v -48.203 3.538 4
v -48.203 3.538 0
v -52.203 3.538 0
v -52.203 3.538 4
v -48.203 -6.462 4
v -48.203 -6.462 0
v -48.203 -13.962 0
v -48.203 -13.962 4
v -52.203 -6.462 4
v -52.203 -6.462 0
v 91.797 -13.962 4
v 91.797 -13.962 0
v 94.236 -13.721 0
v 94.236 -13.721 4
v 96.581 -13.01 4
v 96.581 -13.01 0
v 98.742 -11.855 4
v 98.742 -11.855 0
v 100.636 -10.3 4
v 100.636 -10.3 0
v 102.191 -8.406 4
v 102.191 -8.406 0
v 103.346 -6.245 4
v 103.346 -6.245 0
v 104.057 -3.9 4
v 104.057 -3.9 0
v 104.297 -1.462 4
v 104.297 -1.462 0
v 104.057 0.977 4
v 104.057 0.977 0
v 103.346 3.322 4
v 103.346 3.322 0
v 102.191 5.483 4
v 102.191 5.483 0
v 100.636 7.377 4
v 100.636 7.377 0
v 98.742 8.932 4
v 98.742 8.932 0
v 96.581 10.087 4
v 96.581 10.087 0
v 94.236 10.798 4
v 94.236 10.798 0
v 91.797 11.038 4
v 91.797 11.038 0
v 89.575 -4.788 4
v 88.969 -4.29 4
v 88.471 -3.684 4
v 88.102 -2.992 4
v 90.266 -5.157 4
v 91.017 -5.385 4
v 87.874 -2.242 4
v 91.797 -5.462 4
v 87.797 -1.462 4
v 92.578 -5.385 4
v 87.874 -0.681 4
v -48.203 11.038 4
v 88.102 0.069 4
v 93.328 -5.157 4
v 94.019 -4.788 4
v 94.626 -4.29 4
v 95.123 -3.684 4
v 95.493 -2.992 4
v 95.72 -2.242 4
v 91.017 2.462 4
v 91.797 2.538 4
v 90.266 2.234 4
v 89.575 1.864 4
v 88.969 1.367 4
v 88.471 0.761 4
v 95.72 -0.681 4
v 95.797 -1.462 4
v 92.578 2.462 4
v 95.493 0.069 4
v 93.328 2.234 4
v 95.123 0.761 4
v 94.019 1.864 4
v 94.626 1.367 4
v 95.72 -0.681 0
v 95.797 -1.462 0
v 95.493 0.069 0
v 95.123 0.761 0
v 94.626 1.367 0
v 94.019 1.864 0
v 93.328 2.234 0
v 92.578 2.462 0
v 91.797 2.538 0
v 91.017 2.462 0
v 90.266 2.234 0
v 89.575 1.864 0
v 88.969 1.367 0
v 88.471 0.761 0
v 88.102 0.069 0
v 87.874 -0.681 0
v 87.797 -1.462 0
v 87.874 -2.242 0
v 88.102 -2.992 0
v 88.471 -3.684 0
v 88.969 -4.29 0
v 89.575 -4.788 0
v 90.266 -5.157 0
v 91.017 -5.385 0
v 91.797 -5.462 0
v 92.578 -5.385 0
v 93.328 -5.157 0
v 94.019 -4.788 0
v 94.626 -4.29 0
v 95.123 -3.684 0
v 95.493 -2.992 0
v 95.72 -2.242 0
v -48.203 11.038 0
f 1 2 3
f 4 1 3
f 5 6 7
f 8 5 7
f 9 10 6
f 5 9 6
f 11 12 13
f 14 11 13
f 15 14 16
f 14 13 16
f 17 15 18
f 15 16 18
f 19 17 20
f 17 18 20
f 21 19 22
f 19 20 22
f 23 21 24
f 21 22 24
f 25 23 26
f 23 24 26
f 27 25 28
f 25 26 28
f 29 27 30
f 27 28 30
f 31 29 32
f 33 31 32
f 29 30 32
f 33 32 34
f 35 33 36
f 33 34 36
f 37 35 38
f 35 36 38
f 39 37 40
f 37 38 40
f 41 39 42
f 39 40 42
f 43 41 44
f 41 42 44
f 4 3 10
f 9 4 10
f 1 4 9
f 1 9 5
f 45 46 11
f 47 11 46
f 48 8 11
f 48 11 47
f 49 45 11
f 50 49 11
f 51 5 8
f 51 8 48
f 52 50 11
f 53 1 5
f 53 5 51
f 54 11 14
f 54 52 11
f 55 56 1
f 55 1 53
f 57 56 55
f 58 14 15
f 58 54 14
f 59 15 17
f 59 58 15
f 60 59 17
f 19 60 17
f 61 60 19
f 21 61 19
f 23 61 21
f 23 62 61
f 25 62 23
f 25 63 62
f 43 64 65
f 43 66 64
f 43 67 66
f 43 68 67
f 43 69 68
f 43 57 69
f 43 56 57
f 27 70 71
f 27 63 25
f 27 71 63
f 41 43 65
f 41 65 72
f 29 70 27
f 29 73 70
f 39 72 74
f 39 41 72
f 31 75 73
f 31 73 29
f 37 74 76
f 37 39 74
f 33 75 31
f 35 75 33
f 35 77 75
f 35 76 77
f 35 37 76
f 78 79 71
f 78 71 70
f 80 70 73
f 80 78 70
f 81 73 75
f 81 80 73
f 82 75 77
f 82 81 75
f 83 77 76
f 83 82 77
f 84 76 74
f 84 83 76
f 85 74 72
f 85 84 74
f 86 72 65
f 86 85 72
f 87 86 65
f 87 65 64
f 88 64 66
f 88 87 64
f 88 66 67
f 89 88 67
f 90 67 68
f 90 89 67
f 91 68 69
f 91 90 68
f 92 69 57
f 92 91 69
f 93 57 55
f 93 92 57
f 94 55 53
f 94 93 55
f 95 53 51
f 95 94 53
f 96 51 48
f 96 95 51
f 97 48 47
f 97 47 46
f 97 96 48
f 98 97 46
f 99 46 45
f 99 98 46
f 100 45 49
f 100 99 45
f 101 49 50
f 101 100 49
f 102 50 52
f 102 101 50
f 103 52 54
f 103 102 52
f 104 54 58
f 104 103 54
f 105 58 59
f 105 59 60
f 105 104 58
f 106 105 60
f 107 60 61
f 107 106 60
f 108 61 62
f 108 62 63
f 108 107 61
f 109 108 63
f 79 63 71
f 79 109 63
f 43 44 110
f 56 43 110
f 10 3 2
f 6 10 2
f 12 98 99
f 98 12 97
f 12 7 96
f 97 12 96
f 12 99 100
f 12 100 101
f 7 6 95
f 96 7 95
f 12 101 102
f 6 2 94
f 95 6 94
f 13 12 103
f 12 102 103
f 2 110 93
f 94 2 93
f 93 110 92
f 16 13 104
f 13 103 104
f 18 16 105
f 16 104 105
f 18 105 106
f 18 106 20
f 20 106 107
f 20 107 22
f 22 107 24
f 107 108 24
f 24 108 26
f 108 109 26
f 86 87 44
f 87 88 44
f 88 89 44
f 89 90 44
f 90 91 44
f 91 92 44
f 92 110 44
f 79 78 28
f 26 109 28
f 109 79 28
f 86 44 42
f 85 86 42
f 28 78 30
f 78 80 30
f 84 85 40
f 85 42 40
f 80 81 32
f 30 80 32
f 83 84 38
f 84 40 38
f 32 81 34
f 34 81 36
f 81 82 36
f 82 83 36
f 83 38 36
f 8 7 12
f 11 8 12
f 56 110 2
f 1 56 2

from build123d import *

# Parameters (mm, degrees)
SKETCH2_R           = 4
BOSS_EXTRUDE1_DEPTH = 4


with BuildPart() as part:
    # Sketch2 → Boss-Extrude1 (new body)
    with BuildSketch(Plane.XY):
        with BuildLine():
            Line((-48.202812442, -6.461632916), (-48.202812442, -13.961632916))
            Line((-48.202812442, -13.961632916), (91.797187558, -13.961632916))
            ThreePointArc((91.797187558, -13.961632916), (104.297187558, -1.461632916), (91.797187558, 11.038367084))
            Line((91.797187558, 11.038367084), (-48.202812442, 11.038367084))
            Line((-48.202812442, 11.038367084), (-48.202812442, 3.538367084))
            Line((-48.202812442, 3.538367084), (-52.202812442, 3.538367084))
            Line((-52.202812442, 3.538367084), (-52.202812442, -6.461632916))
            Line((-52.202812442, -6.461632916), (-48.202812442, -6.461632916))
        make_face()
        with Locations((91.797187558, -1.461632916)):
            Circle(SKETCH2_R, mode=Mode.SUBTRACT)
    extrude(amount=BOSS_EXTRUDE1_DEPTH)


solid = part.part
